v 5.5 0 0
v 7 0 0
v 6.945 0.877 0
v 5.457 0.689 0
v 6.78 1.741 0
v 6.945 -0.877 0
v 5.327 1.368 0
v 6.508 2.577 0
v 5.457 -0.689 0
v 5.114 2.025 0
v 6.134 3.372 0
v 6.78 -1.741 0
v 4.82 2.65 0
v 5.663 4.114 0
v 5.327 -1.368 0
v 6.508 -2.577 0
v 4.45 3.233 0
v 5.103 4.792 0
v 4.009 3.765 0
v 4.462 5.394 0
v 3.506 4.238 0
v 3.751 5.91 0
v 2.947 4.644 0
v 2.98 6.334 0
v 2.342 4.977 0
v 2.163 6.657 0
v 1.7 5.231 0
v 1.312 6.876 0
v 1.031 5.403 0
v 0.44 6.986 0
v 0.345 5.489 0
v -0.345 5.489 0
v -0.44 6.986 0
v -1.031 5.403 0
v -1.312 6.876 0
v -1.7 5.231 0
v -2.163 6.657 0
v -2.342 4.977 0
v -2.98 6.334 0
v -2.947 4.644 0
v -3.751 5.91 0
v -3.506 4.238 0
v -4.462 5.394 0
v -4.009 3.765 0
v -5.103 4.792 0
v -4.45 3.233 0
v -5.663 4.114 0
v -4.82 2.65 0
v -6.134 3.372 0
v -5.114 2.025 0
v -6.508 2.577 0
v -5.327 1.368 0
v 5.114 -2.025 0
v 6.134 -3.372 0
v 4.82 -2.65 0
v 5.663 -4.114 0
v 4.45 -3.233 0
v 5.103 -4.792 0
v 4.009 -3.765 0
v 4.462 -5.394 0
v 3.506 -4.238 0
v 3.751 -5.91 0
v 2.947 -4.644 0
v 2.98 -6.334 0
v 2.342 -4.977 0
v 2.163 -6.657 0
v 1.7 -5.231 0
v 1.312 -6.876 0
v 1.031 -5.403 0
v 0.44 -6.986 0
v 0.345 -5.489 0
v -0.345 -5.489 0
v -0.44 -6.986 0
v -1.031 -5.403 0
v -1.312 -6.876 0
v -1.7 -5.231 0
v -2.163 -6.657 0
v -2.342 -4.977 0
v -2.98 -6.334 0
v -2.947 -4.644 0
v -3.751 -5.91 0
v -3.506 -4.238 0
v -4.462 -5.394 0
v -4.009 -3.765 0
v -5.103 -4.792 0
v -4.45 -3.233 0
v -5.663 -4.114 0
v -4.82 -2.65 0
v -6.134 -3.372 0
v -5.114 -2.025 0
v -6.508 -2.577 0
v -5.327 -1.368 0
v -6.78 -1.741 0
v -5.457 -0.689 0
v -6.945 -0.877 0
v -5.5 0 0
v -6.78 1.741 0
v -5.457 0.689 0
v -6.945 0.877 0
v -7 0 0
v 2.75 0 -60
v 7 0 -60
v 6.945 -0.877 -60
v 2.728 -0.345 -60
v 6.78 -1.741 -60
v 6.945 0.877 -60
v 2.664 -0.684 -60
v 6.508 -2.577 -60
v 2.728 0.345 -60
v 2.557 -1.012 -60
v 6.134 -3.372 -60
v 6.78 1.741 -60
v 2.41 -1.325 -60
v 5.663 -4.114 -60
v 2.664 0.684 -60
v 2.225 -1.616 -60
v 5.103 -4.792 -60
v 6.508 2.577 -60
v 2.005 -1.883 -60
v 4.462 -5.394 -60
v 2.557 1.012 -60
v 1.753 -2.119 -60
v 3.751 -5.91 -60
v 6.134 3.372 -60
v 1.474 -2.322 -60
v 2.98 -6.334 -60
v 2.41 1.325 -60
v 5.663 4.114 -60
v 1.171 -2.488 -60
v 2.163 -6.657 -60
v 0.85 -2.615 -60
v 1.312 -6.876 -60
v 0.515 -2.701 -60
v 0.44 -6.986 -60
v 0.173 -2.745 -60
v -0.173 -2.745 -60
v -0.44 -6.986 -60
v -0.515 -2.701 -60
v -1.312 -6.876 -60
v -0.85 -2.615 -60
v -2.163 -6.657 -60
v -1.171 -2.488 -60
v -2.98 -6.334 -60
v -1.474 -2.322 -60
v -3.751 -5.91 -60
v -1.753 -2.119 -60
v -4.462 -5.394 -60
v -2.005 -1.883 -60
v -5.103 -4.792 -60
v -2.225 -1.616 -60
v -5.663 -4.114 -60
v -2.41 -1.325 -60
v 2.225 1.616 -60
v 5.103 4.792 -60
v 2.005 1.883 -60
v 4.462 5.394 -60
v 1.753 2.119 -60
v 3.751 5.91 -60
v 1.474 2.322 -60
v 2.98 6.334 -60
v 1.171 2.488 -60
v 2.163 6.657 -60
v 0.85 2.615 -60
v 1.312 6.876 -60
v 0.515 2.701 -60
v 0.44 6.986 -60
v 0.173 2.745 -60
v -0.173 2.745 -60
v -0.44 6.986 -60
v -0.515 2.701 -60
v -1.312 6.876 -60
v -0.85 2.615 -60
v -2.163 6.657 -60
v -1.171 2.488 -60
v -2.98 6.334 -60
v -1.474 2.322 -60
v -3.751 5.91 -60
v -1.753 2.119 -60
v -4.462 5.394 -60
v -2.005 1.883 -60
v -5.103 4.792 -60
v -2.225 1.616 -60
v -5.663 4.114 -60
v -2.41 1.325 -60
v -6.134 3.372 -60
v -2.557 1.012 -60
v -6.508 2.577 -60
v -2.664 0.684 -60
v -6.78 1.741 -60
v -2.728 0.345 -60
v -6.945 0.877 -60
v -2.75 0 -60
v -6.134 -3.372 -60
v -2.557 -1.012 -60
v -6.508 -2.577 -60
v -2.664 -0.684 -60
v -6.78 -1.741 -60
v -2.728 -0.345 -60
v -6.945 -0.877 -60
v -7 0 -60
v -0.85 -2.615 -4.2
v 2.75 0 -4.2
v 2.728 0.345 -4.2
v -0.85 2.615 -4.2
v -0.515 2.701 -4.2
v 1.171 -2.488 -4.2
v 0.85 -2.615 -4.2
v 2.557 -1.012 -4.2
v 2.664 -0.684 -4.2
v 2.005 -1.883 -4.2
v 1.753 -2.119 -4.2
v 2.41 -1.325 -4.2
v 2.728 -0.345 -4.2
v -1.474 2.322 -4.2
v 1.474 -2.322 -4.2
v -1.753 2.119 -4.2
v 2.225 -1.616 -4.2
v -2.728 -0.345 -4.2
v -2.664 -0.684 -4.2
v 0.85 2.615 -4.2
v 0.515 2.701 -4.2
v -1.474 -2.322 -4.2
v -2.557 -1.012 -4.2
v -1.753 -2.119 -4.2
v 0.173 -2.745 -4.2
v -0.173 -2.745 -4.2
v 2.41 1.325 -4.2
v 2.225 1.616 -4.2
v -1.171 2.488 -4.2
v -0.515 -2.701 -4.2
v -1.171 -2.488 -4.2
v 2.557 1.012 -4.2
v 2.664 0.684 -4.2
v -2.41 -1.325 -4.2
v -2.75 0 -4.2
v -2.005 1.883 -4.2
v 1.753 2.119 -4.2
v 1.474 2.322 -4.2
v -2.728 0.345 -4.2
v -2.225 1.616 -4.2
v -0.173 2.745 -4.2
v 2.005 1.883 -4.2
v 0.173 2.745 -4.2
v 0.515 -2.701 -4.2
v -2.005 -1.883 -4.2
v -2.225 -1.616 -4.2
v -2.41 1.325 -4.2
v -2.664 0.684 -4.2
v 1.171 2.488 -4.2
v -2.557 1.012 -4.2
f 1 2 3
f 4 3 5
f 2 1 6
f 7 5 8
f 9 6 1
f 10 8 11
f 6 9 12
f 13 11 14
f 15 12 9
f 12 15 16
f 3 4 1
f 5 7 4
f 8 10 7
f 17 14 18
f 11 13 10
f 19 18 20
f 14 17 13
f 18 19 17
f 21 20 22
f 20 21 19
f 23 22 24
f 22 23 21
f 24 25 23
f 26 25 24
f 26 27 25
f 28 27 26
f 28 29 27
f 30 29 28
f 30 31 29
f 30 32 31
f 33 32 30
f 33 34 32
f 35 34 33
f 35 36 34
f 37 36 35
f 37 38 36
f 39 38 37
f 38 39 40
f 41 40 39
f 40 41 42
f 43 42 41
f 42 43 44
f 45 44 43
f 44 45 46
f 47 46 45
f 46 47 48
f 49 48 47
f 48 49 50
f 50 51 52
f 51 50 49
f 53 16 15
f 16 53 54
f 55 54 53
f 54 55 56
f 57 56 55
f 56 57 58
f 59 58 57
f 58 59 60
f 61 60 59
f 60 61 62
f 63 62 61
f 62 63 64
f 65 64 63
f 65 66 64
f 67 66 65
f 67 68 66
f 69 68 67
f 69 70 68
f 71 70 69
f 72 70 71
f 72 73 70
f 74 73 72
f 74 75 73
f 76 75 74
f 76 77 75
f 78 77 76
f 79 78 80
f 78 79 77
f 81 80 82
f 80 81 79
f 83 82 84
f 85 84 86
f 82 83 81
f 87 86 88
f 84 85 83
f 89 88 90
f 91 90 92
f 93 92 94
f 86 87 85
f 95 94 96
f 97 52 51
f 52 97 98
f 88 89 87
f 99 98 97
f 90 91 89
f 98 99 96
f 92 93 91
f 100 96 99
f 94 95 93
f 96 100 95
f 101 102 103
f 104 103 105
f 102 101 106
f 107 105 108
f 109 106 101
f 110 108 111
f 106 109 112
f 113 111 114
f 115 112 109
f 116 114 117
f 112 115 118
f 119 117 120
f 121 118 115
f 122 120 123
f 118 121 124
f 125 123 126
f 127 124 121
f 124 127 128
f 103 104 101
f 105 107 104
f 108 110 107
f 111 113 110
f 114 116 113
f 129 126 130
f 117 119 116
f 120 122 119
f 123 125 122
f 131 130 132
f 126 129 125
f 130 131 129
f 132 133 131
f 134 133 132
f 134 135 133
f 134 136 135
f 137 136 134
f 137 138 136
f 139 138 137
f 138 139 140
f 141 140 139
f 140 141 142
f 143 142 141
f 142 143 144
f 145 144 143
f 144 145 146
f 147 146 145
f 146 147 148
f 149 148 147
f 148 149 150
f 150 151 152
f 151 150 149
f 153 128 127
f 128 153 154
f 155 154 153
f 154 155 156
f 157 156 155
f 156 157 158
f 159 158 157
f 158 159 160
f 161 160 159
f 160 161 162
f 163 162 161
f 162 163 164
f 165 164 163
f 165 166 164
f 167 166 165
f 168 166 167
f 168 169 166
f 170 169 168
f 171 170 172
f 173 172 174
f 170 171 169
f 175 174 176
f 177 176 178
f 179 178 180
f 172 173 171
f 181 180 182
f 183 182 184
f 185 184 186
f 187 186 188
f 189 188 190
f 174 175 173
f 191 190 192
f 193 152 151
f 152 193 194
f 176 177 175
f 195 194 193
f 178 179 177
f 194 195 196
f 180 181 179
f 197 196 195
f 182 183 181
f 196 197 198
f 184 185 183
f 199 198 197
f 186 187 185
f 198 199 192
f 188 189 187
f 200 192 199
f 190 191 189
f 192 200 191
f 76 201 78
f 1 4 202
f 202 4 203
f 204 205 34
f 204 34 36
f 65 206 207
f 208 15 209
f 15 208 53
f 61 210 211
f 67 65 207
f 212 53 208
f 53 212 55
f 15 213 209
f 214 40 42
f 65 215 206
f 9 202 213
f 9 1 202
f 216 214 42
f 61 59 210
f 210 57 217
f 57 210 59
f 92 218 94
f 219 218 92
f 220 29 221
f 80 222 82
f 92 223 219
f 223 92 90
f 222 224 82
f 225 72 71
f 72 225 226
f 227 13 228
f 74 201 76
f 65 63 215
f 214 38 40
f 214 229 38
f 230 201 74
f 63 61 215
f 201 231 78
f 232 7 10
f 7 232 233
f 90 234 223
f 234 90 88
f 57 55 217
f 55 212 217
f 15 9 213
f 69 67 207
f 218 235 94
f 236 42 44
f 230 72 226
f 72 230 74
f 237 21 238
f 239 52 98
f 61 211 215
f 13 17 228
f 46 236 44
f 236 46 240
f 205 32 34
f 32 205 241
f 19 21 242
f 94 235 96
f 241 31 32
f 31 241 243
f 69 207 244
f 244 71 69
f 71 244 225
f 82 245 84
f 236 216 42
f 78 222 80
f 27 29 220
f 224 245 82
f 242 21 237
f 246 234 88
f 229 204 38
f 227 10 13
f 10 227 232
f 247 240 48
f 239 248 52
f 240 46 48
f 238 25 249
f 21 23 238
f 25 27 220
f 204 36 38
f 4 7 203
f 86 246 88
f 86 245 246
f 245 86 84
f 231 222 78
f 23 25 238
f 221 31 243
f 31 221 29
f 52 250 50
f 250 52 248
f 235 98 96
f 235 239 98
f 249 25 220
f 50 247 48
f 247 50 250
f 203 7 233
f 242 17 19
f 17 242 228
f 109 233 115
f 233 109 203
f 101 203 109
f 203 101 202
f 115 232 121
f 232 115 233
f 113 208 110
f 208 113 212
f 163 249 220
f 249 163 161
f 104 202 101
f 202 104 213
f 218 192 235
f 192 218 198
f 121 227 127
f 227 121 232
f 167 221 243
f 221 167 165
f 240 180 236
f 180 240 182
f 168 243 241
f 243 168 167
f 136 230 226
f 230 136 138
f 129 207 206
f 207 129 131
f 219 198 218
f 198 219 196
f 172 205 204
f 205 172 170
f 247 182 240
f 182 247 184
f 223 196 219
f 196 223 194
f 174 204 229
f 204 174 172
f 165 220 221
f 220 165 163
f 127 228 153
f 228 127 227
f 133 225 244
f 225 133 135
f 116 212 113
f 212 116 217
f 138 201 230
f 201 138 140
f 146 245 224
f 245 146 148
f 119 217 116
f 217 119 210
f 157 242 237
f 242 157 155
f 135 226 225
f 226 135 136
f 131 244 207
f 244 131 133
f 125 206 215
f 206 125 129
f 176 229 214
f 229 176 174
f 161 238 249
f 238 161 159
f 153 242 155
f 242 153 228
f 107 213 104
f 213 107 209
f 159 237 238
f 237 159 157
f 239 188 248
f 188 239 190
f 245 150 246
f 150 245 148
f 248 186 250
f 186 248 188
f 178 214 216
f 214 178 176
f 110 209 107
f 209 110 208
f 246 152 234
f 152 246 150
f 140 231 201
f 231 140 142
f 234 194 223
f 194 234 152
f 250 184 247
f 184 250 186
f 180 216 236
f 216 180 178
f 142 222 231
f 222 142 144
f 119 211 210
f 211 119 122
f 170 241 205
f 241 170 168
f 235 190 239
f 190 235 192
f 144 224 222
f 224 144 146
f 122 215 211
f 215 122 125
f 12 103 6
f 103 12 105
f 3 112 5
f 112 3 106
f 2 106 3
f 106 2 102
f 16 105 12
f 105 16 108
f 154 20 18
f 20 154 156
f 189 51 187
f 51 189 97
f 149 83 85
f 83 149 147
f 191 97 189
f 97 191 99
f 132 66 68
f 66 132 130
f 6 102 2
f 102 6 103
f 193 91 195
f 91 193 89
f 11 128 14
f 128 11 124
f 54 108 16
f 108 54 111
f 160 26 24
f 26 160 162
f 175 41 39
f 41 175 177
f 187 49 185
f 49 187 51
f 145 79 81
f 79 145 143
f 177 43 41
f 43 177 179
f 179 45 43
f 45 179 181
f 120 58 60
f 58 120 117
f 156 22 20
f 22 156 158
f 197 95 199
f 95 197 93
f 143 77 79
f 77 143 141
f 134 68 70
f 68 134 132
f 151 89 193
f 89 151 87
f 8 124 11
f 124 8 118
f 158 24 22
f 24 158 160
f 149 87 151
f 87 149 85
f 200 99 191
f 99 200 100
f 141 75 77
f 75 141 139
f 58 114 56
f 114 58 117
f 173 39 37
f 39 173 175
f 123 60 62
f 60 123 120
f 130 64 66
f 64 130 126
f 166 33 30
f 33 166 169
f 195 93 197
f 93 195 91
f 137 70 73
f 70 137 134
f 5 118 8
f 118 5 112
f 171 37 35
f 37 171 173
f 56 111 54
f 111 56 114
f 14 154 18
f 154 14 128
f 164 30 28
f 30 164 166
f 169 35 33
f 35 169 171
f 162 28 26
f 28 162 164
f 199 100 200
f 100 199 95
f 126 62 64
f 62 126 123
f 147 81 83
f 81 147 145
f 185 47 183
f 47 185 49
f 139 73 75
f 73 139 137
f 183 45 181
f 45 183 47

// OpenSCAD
$fn = 50;


difference() {
	union() {
		translate(v = [0, 0, -60.0000000000]) {
			cylinder(h = 60, r = 7.0000000000);
		}
		cylinder(h = 0, r = 17.0000000000);
	}
	union() {
		translate(v = [0, 0, 0]) {
			rotate(a = [0, 0, 0]) {
				difference() {
					union() {
						#translate(v = [0, 0, -60.0000000000]) {
							cylinder(h = 60, r = 2.2500000000);
						}
						#translate(v = [0, 0, -4.2000000000]) {
							cylinder(h = 4.2000000000, r = 7.0000000000, r1 = 2.7500000000, r2 = 5.5000000000);
						}
						#translate(v = [0, 0, -60.0000000000]) {
							cylinder(h = 60, r = 2.7500000000);
						}
						#translate(v = [0, 0, -60.0000000000]) {
							cylinder(h = 60, r = 2.2500000000);
						}
					}
					union();
				}
			}
		}
	}
}
